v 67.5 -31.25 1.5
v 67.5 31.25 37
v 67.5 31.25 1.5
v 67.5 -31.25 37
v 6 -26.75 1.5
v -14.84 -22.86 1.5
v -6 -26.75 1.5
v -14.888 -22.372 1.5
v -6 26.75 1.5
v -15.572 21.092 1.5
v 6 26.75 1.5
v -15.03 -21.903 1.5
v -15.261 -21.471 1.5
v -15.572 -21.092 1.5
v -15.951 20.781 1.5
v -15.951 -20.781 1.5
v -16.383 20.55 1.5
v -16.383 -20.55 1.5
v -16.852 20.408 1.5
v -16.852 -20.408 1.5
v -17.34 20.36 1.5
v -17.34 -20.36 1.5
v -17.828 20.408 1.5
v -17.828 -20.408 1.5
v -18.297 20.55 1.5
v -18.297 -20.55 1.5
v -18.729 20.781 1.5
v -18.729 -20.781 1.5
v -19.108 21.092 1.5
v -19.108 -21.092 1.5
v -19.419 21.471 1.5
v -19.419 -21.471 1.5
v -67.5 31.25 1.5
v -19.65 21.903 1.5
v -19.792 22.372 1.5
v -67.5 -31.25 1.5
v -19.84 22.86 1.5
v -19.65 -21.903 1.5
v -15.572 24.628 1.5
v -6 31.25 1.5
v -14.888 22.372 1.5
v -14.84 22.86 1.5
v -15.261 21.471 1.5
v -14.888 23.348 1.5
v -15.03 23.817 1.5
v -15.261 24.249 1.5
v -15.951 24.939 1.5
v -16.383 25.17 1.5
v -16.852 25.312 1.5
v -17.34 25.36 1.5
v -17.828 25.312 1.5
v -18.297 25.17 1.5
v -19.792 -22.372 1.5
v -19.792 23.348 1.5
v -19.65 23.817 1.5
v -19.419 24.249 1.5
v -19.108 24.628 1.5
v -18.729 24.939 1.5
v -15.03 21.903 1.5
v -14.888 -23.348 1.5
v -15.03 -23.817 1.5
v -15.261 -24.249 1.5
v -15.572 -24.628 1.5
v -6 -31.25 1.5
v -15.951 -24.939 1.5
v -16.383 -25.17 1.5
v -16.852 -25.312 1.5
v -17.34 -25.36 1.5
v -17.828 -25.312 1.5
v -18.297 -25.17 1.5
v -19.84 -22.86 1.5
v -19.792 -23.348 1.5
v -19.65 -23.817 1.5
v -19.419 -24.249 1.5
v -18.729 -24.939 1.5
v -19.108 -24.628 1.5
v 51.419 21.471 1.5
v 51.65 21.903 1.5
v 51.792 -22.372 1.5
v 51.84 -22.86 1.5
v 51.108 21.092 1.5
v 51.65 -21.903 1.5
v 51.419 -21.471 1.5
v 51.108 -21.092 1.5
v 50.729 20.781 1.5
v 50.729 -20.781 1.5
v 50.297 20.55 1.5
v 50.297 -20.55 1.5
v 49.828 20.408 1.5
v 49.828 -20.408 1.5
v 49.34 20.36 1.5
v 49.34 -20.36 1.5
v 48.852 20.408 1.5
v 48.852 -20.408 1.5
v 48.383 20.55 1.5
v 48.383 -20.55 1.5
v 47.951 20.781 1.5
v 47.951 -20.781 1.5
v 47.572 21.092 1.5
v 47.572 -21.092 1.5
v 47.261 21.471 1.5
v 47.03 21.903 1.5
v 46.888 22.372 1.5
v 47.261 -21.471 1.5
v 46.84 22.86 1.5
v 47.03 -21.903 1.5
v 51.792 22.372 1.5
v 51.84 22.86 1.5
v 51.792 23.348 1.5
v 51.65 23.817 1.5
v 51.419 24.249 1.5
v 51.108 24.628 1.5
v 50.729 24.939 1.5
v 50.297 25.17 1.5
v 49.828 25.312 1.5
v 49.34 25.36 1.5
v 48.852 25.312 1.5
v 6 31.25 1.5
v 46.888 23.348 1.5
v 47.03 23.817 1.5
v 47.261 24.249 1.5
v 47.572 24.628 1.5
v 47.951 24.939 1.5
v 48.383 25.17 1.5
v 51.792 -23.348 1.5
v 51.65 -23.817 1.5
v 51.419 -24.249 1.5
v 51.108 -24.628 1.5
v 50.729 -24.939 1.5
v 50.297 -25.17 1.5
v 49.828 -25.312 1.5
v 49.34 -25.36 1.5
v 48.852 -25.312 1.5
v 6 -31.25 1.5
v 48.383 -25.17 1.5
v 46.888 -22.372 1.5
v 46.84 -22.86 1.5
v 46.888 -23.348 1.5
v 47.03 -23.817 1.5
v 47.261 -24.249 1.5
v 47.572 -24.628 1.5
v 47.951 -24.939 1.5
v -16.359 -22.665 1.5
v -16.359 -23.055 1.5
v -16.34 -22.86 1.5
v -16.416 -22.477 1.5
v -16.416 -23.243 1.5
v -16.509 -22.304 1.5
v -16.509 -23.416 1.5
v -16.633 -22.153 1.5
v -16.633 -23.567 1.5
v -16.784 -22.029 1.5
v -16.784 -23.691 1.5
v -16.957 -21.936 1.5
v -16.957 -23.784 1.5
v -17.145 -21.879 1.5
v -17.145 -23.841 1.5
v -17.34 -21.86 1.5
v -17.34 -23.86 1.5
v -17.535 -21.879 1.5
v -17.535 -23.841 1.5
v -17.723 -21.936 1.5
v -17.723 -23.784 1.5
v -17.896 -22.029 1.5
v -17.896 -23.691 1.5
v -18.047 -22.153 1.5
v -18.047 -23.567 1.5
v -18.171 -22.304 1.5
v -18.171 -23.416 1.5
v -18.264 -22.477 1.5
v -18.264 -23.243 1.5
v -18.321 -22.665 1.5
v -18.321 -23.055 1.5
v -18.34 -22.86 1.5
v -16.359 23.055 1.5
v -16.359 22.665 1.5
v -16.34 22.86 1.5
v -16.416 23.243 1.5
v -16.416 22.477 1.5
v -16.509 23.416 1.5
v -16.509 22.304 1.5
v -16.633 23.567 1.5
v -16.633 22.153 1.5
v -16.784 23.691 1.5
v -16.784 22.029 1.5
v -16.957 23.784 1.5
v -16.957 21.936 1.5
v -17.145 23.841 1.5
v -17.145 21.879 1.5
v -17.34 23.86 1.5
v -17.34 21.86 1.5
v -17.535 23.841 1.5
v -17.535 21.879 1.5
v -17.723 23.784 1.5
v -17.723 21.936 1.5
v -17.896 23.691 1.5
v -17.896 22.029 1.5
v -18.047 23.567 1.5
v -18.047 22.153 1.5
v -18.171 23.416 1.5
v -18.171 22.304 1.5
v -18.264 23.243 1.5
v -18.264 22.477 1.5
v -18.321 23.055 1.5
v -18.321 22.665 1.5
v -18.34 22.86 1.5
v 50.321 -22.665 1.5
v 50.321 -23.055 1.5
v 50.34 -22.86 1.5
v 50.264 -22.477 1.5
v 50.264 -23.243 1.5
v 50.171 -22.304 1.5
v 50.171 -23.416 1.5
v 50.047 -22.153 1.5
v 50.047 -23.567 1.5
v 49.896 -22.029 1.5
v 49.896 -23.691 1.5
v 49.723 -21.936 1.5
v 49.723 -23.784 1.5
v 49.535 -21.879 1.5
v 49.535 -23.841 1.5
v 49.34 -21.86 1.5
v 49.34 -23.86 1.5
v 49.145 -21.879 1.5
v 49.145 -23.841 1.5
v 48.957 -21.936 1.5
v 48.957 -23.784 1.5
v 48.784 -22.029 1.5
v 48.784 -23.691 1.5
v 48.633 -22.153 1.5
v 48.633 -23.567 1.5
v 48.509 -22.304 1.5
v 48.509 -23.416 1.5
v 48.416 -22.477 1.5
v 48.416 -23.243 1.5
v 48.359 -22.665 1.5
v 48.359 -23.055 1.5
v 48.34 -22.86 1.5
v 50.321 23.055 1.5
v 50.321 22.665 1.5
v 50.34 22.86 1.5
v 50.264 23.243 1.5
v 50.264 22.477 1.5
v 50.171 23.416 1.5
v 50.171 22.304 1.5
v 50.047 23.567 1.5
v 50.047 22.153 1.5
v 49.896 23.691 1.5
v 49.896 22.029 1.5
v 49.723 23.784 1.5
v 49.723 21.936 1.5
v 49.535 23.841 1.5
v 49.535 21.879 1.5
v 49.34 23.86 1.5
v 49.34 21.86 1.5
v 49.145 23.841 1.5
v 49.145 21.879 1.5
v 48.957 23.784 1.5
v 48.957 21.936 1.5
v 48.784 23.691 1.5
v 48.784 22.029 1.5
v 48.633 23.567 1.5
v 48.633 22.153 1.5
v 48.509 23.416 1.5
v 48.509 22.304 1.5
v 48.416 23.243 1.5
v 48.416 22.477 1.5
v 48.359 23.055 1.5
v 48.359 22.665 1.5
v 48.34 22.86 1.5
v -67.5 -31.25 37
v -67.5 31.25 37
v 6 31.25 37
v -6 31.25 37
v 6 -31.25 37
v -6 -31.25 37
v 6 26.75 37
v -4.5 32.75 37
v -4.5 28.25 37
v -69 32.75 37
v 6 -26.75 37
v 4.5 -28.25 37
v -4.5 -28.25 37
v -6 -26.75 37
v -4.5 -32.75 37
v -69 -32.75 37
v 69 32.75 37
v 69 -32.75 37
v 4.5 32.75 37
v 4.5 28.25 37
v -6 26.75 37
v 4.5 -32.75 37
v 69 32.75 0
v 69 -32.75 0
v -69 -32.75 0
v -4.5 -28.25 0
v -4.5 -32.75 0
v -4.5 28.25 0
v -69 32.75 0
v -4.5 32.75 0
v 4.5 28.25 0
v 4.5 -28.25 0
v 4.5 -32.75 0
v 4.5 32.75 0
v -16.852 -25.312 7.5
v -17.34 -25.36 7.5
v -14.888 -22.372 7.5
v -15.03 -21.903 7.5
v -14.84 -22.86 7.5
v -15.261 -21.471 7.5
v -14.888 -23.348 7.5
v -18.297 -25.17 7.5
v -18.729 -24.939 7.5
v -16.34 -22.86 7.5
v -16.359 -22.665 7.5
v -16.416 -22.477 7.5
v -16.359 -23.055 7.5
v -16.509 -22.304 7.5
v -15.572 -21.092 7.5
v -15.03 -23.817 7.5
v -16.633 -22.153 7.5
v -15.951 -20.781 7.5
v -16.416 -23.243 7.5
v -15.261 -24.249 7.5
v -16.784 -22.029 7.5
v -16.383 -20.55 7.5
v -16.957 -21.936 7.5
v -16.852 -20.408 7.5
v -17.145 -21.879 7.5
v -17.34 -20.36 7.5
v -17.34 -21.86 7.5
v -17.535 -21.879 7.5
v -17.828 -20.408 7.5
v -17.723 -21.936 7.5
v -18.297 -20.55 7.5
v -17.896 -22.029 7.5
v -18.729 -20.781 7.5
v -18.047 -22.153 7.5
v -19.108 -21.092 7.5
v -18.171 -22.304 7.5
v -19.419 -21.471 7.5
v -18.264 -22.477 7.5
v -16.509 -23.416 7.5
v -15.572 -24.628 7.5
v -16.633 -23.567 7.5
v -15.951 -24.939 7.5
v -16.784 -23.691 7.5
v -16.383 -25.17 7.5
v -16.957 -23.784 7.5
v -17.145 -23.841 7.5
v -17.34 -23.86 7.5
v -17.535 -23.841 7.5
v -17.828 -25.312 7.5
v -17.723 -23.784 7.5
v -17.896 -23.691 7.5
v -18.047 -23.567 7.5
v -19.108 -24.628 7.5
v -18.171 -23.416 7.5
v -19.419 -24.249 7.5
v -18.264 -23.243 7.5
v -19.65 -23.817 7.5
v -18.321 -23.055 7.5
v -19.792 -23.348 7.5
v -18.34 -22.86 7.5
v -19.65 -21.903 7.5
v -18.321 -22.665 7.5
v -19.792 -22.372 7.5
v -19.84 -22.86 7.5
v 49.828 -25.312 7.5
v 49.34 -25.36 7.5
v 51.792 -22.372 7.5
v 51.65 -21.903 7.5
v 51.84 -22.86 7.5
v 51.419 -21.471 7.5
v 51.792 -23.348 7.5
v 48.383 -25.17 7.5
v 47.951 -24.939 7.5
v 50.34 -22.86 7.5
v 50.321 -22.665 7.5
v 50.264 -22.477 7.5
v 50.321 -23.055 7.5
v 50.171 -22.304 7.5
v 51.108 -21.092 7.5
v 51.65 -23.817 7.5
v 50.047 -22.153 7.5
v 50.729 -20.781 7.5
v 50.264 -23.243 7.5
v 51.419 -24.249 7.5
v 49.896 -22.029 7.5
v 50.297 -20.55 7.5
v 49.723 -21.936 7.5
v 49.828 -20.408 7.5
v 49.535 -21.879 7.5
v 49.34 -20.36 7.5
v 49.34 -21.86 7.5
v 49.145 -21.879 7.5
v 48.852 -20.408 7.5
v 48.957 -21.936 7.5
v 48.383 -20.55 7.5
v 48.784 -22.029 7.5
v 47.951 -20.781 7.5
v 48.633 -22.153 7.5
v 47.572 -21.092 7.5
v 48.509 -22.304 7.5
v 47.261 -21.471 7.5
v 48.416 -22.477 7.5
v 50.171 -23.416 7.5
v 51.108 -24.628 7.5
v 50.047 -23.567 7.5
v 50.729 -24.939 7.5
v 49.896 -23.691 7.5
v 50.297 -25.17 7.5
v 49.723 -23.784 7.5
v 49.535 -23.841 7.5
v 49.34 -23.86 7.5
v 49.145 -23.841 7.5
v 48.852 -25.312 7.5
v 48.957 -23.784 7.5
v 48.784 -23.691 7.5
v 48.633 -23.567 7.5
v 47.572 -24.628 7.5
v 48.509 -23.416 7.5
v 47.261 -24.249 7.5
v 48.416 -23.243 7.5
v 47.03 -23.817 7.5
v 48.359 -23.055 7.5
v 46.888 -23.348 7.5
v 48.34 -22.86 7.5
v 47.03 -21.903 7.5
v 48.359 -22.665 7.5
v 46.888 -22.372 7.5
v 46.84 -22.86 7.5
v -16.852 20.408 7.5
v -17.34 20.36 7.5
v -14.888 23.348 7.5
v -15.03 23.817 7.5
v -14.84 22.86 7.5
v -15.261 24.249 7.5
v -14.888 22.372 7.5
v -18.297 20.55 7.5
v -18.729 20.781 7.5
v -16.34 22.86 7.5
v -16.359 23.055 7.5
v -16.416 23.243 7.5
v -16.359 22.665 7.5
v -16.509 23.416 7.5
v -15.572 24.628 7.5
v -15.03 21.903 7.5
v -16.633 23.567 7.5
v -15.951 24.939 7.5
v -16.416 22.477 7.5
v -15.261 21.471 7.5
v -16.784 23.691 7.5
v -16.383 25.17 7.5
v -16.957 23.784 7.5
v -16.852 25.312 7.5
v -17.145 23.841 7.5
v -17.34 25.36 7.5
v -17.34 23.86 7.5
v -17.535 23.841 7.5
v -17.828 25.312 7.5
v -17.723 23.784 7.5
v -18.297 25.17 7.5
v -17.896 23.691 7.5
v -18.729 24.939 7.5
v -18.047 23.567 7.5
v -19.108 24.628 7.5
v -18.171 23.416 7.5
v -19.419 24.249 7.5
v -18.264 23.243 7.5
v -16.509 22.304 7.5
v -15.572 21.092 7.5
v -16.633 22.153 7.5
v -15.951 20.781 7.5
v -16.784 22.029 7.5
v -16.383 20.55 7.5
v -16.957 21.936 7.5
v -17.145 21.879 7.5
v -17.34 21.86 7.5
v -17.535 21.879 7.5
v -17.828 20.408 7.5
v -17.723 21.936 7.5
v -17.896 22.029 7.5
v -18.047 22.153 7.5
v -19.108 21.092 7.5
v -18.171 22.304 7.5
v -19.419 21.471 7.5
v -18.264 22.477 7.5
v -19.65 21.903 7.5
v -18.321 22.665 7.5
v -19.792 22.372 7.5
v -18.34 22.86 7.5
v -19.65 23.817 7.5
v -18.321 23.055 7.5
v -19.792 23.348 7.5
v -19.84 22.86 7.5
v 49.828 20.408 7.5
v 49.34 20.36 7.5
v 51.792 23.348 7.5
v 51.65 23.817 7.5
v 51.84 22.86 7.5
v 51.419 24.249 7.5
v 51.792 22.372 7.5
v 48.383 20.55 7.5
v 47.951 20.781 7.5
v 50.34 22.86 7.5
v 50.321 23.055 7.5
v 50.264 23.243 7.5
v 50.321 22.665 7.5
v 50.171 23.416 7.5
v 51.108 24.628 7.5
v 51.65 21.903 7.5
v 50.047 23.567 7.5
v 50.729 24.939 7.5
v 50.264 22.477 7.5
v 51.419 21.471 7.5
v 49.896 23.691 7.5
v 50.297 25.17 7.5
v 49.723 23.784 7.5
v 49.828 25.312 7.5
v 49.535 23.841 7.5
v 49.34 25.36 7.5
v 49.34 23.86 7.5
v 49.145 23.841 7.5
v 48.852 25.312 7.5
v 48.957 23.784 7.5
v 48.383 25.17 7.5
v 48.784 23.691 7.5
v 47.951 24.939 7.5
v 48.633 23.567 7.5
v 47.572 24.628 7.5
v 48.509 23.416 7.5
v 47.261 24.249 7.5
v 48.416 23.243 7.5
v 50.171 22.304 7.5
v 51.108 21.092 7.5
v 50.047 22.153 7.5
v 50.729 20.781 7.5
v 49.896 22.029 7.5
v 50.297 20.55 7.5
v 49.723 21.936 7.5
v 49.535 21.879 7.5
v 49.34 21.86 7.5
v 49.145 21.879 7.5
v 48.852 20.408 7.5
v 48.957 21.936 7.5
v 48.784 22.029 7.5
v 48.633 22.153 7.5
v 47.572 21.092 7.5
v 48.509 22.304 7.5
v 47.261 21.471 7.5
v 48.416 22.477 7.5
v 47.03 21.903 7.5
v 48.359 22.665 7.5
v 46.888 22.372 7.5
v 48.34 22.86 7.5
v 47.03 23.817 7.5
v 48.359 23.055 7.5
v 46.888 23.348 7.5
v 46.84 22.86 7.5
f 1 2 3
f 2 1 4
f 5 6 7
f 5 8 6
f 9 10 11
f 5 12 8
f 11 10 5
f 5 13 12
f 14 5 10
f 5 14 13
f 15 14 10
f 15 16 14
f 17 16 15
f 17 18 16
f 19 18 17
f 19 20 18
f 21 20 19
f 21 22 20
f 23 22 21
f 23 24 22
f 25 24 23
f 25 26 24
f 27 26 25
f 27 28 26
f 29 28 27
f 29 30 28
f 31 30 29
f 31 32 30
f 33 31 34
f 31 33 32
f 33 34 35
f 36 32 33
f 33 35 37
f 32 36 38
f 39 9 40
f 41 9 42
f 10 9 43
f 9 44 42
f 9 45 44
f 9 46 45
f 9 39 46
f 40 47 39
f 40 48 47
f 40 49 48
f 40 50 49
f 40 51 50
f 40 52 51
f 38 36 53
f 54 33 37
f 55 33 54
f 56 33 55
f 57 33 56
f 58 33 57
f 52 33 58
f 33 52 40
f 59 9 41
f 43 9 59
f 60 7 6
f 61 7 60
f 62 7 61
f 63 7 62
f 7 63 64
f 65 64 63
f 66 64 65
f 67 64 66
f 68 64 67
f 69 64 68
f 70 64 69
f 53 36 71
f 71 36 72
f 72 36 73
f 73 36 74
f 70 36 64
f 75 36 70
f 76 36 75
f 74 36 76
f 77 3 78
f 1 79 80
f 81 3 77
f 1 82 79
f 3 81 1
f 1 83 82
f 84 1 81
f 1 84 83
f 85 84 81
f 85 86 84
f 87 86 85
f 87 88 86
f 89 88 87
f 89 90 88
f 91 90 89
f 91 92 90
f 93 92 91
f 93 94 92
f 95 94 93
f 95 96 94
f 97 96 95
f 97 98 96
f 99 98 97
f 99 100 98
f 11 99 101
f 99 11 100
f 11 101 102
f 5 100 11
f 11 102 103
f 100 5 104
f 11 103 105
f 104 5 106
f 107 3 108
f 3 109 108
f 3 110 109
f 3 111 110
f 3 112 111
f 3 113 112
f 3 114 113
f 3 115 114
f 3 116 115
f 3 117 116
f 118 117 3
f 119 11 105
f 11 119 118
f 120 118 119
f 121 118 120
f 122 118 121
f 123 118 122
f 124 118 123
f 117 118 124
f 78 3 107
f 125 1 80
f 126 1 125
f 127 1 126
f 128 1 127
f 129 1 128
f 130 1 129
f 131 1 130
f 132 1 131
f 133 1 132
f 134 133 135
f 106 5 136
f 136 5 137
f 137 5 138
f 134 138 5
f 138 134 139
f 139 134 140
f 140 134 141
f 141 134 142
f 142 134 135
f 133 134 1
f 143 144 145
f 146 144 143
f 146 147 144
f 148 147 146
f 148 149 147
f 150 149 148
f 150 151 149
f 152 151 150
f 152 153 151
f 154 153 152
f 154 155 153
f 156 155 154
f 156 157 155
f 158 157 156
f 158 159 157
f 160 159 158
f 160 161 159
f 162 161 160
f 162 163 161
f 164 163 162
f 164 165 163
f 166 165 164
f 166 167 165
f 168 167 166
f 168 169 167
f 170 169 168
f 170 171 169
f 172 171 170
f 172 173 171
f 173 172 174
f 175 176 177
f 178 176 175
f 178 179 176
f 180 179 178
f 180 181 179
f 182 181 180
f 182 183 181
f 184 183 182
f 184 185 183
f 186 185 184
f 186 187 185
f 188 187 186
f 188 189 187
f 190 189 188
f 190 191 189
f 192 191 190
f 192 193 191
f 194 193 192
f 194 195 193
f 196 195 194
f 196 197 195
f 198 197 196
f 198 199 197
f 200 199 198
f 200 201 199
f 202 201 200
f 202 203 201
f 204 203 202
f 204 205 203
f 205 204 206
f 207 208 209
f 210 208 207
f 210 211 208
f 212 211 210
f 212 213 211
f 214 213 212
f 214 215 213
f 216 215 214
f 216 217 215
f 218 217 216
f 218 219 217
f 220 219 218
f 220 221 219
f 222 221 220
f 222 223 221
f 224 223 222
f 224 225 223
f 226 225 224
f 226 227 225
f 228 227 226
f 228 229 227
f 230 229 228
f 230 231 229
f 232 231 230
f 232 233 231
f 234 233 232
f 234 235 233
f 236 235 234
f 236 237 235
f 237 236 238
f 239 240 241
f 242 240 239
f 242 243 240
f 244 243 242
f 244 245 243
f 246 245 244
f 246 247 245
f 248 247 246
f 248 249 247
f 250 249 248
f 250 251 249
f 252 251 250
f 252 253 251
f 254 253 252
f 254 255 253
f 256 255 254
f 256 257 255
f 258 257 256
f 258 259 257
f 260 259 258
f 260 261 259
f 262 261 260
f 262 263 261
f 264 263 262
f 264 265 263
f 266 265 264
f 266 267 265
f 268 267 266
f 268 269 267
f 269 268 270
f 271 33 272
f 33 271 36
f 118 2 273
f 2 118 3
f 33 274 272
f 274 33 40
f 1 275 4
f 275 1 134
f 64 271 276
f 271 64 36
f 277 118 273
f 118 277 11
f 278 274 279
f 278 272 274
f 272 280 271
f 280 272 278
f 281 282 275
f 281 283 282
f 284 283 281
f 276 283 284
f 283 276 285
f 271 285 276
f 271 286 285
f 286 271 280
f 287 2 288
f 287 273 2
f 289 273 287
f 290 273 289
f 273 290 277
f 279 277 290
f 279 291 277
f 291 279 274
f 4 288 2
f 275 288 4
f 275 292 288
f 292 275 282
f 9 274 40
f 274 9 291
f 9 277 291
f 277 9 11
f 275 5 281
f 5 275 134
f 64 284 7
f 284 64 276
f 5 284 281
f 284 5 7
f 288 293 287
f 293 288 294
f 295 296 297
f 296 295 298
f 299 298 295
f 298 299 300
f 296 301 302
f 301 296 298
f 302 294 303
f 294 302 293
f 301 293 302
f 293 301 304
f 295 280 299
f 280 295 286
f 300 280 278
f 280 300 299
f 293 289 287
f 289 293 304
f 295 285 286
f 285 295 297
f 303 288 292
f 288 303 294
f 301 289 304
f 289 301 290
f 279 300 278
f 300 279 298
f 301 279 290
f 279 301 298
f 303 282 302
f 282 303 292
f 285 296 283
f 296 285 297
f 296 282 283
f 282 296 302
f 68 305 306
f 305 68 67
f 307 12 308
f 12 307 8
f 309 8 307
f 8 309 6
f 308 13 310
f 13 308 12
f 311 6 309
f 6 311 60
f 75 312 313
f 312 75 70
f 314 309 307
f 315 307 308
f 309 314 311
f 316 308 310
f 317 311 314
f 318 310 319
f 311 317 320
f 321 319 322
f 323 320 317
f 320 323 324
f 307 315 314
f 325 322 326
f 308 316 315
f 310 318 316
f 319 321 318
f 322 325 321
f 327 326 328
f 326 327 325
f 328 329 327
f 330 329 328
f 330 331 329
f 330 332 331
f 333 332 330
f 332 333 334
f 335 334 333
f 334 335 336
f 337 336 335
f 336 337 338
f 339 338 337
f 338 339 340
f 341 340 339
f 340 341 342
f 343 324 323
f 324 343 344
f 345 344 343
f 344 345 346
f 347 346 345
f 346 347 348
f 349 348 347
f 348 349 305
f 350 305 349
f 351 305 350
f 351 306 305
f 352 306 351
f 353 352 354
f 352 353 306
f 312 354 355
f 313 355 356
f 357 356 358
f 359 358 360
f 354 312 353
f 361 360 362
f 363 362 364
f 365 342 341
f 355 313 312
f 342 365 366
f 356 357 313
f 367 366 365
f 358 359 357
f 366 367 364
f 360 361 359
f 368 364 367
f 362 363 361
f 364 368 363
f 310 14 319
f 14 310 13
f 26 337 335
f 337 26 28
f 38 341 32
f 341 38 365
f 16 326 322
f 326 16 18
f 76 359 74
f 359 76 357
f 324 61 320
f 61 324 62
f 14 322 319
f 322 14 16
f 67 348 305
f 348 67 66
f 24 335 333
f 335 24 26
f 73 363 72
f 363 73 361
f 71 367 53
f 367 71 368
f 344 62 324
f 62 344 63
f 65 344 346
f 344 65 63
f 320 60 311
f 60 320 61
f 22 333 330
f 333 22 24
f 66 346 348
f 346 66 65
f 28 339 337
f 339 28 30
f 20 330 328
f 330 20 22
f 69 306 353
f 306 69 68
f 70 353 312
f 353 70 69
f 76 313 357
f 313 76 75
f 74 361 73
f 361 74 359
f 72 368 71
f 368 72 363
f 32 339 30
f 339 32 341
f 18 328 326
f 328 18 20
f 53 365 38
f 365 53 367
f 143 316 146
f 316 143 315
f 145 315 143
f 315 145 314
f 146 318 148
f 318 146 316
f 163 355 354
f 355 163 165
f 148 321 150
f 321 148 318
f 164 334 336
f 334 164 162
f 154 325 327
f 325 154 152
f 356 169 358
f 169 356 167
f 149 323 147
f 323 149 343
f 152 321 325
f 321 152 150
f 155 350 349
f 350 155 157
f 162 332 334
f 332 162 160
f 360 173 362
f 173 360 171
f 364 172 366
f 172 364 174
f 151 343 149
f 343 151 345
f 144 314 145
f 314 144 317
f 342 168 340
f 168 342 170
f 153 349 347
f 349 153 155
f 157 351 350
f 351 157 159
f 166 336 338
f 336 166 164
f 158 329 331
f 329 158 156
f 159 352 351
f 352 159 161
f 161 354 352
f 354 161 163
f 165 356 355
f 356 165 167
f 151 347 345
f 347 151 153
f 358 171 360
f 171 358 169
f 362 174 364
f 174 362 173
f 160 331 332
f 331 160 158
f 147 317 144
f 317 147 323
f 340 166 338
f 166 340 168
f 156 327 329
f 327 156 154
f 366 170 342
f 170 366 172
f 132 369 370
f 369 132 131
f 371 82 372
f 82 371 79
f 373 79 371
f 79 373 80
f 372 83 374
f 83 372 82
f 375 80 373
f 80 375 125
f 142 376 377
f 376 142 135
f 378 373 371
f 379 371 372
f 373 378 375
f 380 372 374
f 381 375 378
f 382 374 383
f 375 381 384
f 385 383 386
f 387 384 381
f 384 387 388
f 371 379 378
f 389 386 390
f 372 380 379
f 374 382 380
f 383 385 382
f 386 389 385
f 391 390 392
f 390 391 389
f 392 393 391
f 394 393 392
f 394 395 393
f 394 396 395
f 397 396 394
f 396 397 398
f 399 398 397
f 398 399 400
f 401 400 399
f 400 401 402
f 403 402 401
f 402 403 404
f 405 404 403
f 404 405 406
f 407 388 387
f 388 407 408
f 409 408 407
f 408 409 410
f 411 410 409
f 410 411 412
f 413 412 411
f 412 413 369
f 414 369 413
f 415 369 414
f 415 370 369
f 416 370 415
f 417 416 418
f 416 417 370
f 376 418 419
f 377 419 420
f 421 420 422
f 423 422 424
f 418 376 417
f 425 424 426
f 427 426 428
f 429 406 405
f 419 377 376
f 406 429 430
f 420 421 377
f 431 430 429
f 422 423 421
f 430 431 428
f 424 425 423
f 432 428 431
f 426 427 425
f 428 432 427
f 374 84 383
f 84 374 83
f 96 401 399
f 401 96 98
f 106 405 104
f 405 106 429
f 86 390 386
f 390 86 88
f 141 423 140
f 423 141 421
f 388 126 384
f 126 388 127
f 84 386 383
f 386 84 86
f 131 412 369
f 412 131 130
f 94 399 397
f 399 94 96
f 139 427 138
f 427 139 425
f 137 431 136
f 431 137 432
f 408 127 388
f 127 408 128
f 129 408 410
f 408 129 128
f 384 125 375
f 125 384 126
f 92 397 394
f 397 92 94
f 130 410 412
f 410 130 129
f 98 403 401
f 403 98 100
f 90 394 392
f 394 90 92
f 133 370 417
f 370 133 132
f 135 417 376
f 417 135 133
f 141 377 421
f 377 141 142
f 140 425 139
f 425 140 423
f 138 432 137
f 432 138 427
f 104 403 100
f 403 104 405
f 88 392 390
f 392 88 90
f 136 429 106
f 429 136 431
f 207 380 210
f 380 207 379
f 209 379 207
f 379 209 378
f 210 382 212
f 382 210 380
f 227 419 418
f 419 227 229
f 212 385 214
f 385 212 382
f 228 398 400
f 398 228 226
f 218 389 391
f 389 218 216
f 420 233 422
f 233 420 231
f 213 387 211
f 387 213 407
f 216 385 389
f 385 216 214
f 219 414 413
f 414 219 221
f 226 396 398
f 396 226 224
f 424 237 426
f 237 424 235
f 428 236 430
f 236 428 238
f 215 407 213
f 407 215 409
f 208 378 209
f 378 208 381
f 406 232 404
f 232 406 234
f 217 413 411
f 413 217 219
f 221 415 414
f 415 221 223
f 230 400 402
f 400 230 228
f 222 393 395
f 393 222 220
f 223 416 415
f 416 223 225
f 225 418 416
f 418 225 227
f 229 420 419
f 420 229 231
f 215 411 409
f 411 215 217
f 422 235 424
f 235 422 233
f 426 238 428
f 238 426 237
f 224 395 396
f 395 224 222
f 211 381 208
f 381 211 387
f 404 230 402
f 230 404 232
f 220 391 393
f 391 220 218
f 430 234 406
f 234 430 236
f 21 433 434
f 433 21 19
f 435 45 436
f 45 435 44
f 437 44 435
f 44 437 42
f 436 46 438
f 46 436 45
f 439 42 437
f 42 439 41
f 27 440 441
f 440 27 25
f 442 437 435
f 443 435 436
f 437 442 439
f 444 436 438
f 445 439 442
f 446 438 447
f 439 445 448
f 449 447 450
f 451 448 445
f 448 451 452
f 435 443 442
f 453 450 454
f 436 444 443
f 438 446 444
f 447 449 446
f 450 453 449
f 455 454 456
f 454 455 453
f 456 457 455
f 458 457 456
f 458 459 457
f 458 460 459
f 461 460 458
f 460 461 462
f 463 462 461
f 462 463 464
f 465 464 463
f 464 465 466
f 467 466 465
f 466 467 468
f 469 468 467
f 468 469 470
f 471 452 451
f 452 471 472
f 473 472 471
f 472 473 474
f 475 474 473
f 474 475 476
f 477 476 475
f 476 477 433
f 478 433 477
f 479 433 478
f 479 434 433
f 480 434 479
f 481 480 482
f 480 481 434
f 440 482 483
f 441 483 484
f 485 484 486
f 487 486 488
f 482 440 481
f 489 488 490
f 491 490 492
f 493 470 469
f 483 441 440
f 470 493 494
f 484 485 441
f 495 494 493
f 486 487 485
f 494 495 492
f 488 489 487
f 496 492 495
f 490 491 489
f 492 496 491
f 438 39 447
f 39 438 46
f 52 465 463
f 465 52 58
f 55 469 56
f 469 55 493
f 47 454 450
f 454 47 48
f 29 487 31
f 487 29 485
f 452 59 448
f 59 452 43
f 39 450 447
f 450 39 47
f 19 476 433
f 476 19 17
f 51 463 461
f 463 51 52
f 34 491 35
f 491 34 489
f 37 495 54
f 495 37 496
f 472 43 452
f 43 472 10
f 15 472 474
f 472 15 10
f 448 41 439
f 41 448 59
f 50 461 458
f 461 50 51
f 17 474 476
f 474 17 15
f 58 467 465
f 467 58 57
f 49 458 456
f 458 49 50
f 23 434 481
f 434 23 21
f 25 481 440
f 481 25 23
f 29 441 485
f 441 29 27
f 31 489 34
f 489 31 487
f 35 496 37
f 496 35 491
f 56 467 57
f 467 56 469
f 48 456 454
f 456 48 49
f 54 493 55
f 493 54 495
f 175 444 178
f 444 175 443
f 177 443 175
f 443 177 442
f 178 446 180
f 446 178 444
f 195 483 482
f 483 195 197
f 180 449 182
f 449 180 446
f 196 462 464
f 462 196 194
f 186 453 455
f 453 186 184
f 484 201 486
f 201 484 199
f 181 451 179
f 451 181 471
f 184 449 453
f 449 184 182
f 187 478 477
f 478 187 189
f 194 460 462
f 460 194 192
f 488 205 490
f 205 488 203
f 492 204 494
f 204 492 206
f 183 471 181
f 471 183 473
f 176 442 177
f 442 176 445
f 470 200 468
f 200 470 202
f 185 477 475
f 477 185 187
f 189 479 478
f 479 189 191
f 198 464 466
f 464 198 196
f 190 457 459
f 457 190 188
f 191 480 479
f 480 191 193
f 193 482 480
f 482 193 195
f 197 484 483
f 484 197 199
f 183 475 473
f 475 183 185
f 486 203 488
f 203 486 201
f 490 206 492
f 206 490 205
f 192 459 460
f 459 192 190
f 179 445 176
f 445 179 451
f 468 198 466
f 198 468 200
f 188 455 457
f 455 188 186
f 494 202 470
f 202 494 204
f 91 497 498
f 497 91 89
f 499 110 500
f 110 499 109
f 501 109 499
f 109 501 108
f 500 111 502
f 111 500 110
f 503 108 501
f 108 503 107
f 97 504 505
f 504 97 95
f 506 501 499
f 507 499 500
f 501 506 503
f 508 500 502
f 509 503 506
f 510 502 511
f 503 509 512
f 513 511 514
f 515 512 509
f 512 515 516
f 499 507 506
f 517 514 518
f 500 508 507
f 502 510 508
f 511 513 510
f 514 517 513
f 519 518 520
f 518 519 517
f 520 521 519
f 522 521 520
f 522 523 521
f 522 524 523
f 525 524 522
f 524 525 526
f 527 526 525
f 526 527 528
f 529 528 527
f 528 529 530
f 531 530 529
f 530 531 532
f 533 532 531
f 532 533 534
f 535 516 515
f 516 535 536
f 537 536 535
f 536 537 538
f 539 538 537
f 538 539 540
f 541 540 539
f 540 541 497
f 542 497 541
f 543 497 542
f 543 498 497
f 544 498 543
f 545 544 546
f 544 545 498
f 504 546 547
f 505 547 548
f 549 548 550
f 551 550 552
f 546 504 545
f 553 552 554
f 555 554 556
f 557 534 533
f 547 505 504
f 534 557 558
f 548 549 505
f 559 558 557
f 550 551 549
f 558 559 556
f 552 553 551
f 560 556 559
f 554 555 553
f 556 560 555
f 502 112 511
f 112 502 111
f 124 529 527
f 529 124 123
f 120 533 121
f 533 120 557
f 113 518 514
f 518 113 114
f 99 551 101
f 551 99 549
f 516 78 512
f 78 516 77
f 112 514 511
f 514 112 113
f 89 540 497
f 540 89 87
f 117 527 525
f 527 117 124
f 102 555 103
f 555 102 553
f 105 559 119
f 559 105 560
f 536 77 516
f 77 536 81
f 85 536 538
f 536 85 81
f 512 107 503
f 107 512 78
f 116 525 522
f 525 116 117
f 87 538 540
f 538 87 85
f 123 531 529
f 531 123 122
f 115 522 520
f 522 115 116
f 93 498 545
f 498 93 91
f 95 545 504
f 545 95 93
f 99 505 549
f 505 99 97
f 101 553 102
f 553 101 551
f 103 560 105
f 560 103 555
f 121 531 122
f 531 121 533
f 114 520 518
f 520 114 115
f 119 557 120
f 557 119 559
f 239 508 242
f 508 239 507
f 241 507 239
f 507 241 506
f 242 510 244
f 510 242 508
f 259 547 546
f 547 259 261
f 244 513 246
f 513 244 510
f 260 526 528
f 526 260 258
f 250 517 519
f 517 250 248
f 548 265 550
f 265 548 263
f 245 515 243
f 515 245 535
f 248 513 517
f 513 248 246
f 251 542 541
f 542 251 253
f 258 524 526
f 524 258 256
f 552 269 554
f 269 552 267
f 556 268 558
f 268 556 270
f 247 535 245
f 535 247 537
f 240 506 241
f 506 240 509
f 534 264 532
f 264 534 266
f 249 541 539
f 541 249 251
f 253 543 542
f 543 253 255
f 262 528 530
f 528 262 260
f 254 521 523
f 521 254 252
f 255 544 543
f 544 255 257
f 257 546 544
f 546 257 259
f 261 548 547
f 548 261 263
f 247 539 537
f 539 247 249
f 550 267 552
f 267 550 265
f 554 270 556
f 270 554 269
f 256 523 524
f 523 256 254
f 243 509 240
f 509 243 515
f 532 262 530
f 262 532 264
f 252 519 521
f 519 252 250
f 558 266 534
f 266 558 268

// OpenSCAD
L=138;
W=65.5;
H=37;

bW=45.72;
bL=66.68;

difference() {
    translate([-L/2,-W/2,0])
    cube([L,W,H]);
    
    difference() {
        translate([-L/2+1.5,-W/2+1.5,1.5])
        cube([L-3,W-3,H]);
        translate([-6,W/2-6,0])
        cube([12,6,H]);
        translate([-6,-W/2,0])
        cube([12,6,H]);
    }

        translate([-4.5,W/2-6+1.5,0])
        cube([9,6,H]);
        translate([-4.5,-W/2-1.5,0])
        cube([9,6,H]);
    /*
    translate([0,-W/2,0])
    cube([8,8,H]);
    translate([0,W/2,0])
    cube([8,8,H]);
*/
    /*
    translate([0,0,8])
    minkowski() {
        rotate([90,0,0])
        cylinder(d=8,h=W*2,center=true,$fn=32);
        cube([.001,.001,22]);
    }
    */
}

translate([16,0,0]) {
translate([-bL/2,-bW/2,1.5])
standoff();
translate([bL/2,-bW/2,1.5])
standoff();
translate([-bL/2,bW/2,1.5])
standoff();
translate([bL/2,bW/2,1.5])
standoff();
}

module standoff() {
    difference() {
        cylinder(d=5,h=6,$fn=32);
        cylinder(d=2,h=6,$fn=32);
    }
}
